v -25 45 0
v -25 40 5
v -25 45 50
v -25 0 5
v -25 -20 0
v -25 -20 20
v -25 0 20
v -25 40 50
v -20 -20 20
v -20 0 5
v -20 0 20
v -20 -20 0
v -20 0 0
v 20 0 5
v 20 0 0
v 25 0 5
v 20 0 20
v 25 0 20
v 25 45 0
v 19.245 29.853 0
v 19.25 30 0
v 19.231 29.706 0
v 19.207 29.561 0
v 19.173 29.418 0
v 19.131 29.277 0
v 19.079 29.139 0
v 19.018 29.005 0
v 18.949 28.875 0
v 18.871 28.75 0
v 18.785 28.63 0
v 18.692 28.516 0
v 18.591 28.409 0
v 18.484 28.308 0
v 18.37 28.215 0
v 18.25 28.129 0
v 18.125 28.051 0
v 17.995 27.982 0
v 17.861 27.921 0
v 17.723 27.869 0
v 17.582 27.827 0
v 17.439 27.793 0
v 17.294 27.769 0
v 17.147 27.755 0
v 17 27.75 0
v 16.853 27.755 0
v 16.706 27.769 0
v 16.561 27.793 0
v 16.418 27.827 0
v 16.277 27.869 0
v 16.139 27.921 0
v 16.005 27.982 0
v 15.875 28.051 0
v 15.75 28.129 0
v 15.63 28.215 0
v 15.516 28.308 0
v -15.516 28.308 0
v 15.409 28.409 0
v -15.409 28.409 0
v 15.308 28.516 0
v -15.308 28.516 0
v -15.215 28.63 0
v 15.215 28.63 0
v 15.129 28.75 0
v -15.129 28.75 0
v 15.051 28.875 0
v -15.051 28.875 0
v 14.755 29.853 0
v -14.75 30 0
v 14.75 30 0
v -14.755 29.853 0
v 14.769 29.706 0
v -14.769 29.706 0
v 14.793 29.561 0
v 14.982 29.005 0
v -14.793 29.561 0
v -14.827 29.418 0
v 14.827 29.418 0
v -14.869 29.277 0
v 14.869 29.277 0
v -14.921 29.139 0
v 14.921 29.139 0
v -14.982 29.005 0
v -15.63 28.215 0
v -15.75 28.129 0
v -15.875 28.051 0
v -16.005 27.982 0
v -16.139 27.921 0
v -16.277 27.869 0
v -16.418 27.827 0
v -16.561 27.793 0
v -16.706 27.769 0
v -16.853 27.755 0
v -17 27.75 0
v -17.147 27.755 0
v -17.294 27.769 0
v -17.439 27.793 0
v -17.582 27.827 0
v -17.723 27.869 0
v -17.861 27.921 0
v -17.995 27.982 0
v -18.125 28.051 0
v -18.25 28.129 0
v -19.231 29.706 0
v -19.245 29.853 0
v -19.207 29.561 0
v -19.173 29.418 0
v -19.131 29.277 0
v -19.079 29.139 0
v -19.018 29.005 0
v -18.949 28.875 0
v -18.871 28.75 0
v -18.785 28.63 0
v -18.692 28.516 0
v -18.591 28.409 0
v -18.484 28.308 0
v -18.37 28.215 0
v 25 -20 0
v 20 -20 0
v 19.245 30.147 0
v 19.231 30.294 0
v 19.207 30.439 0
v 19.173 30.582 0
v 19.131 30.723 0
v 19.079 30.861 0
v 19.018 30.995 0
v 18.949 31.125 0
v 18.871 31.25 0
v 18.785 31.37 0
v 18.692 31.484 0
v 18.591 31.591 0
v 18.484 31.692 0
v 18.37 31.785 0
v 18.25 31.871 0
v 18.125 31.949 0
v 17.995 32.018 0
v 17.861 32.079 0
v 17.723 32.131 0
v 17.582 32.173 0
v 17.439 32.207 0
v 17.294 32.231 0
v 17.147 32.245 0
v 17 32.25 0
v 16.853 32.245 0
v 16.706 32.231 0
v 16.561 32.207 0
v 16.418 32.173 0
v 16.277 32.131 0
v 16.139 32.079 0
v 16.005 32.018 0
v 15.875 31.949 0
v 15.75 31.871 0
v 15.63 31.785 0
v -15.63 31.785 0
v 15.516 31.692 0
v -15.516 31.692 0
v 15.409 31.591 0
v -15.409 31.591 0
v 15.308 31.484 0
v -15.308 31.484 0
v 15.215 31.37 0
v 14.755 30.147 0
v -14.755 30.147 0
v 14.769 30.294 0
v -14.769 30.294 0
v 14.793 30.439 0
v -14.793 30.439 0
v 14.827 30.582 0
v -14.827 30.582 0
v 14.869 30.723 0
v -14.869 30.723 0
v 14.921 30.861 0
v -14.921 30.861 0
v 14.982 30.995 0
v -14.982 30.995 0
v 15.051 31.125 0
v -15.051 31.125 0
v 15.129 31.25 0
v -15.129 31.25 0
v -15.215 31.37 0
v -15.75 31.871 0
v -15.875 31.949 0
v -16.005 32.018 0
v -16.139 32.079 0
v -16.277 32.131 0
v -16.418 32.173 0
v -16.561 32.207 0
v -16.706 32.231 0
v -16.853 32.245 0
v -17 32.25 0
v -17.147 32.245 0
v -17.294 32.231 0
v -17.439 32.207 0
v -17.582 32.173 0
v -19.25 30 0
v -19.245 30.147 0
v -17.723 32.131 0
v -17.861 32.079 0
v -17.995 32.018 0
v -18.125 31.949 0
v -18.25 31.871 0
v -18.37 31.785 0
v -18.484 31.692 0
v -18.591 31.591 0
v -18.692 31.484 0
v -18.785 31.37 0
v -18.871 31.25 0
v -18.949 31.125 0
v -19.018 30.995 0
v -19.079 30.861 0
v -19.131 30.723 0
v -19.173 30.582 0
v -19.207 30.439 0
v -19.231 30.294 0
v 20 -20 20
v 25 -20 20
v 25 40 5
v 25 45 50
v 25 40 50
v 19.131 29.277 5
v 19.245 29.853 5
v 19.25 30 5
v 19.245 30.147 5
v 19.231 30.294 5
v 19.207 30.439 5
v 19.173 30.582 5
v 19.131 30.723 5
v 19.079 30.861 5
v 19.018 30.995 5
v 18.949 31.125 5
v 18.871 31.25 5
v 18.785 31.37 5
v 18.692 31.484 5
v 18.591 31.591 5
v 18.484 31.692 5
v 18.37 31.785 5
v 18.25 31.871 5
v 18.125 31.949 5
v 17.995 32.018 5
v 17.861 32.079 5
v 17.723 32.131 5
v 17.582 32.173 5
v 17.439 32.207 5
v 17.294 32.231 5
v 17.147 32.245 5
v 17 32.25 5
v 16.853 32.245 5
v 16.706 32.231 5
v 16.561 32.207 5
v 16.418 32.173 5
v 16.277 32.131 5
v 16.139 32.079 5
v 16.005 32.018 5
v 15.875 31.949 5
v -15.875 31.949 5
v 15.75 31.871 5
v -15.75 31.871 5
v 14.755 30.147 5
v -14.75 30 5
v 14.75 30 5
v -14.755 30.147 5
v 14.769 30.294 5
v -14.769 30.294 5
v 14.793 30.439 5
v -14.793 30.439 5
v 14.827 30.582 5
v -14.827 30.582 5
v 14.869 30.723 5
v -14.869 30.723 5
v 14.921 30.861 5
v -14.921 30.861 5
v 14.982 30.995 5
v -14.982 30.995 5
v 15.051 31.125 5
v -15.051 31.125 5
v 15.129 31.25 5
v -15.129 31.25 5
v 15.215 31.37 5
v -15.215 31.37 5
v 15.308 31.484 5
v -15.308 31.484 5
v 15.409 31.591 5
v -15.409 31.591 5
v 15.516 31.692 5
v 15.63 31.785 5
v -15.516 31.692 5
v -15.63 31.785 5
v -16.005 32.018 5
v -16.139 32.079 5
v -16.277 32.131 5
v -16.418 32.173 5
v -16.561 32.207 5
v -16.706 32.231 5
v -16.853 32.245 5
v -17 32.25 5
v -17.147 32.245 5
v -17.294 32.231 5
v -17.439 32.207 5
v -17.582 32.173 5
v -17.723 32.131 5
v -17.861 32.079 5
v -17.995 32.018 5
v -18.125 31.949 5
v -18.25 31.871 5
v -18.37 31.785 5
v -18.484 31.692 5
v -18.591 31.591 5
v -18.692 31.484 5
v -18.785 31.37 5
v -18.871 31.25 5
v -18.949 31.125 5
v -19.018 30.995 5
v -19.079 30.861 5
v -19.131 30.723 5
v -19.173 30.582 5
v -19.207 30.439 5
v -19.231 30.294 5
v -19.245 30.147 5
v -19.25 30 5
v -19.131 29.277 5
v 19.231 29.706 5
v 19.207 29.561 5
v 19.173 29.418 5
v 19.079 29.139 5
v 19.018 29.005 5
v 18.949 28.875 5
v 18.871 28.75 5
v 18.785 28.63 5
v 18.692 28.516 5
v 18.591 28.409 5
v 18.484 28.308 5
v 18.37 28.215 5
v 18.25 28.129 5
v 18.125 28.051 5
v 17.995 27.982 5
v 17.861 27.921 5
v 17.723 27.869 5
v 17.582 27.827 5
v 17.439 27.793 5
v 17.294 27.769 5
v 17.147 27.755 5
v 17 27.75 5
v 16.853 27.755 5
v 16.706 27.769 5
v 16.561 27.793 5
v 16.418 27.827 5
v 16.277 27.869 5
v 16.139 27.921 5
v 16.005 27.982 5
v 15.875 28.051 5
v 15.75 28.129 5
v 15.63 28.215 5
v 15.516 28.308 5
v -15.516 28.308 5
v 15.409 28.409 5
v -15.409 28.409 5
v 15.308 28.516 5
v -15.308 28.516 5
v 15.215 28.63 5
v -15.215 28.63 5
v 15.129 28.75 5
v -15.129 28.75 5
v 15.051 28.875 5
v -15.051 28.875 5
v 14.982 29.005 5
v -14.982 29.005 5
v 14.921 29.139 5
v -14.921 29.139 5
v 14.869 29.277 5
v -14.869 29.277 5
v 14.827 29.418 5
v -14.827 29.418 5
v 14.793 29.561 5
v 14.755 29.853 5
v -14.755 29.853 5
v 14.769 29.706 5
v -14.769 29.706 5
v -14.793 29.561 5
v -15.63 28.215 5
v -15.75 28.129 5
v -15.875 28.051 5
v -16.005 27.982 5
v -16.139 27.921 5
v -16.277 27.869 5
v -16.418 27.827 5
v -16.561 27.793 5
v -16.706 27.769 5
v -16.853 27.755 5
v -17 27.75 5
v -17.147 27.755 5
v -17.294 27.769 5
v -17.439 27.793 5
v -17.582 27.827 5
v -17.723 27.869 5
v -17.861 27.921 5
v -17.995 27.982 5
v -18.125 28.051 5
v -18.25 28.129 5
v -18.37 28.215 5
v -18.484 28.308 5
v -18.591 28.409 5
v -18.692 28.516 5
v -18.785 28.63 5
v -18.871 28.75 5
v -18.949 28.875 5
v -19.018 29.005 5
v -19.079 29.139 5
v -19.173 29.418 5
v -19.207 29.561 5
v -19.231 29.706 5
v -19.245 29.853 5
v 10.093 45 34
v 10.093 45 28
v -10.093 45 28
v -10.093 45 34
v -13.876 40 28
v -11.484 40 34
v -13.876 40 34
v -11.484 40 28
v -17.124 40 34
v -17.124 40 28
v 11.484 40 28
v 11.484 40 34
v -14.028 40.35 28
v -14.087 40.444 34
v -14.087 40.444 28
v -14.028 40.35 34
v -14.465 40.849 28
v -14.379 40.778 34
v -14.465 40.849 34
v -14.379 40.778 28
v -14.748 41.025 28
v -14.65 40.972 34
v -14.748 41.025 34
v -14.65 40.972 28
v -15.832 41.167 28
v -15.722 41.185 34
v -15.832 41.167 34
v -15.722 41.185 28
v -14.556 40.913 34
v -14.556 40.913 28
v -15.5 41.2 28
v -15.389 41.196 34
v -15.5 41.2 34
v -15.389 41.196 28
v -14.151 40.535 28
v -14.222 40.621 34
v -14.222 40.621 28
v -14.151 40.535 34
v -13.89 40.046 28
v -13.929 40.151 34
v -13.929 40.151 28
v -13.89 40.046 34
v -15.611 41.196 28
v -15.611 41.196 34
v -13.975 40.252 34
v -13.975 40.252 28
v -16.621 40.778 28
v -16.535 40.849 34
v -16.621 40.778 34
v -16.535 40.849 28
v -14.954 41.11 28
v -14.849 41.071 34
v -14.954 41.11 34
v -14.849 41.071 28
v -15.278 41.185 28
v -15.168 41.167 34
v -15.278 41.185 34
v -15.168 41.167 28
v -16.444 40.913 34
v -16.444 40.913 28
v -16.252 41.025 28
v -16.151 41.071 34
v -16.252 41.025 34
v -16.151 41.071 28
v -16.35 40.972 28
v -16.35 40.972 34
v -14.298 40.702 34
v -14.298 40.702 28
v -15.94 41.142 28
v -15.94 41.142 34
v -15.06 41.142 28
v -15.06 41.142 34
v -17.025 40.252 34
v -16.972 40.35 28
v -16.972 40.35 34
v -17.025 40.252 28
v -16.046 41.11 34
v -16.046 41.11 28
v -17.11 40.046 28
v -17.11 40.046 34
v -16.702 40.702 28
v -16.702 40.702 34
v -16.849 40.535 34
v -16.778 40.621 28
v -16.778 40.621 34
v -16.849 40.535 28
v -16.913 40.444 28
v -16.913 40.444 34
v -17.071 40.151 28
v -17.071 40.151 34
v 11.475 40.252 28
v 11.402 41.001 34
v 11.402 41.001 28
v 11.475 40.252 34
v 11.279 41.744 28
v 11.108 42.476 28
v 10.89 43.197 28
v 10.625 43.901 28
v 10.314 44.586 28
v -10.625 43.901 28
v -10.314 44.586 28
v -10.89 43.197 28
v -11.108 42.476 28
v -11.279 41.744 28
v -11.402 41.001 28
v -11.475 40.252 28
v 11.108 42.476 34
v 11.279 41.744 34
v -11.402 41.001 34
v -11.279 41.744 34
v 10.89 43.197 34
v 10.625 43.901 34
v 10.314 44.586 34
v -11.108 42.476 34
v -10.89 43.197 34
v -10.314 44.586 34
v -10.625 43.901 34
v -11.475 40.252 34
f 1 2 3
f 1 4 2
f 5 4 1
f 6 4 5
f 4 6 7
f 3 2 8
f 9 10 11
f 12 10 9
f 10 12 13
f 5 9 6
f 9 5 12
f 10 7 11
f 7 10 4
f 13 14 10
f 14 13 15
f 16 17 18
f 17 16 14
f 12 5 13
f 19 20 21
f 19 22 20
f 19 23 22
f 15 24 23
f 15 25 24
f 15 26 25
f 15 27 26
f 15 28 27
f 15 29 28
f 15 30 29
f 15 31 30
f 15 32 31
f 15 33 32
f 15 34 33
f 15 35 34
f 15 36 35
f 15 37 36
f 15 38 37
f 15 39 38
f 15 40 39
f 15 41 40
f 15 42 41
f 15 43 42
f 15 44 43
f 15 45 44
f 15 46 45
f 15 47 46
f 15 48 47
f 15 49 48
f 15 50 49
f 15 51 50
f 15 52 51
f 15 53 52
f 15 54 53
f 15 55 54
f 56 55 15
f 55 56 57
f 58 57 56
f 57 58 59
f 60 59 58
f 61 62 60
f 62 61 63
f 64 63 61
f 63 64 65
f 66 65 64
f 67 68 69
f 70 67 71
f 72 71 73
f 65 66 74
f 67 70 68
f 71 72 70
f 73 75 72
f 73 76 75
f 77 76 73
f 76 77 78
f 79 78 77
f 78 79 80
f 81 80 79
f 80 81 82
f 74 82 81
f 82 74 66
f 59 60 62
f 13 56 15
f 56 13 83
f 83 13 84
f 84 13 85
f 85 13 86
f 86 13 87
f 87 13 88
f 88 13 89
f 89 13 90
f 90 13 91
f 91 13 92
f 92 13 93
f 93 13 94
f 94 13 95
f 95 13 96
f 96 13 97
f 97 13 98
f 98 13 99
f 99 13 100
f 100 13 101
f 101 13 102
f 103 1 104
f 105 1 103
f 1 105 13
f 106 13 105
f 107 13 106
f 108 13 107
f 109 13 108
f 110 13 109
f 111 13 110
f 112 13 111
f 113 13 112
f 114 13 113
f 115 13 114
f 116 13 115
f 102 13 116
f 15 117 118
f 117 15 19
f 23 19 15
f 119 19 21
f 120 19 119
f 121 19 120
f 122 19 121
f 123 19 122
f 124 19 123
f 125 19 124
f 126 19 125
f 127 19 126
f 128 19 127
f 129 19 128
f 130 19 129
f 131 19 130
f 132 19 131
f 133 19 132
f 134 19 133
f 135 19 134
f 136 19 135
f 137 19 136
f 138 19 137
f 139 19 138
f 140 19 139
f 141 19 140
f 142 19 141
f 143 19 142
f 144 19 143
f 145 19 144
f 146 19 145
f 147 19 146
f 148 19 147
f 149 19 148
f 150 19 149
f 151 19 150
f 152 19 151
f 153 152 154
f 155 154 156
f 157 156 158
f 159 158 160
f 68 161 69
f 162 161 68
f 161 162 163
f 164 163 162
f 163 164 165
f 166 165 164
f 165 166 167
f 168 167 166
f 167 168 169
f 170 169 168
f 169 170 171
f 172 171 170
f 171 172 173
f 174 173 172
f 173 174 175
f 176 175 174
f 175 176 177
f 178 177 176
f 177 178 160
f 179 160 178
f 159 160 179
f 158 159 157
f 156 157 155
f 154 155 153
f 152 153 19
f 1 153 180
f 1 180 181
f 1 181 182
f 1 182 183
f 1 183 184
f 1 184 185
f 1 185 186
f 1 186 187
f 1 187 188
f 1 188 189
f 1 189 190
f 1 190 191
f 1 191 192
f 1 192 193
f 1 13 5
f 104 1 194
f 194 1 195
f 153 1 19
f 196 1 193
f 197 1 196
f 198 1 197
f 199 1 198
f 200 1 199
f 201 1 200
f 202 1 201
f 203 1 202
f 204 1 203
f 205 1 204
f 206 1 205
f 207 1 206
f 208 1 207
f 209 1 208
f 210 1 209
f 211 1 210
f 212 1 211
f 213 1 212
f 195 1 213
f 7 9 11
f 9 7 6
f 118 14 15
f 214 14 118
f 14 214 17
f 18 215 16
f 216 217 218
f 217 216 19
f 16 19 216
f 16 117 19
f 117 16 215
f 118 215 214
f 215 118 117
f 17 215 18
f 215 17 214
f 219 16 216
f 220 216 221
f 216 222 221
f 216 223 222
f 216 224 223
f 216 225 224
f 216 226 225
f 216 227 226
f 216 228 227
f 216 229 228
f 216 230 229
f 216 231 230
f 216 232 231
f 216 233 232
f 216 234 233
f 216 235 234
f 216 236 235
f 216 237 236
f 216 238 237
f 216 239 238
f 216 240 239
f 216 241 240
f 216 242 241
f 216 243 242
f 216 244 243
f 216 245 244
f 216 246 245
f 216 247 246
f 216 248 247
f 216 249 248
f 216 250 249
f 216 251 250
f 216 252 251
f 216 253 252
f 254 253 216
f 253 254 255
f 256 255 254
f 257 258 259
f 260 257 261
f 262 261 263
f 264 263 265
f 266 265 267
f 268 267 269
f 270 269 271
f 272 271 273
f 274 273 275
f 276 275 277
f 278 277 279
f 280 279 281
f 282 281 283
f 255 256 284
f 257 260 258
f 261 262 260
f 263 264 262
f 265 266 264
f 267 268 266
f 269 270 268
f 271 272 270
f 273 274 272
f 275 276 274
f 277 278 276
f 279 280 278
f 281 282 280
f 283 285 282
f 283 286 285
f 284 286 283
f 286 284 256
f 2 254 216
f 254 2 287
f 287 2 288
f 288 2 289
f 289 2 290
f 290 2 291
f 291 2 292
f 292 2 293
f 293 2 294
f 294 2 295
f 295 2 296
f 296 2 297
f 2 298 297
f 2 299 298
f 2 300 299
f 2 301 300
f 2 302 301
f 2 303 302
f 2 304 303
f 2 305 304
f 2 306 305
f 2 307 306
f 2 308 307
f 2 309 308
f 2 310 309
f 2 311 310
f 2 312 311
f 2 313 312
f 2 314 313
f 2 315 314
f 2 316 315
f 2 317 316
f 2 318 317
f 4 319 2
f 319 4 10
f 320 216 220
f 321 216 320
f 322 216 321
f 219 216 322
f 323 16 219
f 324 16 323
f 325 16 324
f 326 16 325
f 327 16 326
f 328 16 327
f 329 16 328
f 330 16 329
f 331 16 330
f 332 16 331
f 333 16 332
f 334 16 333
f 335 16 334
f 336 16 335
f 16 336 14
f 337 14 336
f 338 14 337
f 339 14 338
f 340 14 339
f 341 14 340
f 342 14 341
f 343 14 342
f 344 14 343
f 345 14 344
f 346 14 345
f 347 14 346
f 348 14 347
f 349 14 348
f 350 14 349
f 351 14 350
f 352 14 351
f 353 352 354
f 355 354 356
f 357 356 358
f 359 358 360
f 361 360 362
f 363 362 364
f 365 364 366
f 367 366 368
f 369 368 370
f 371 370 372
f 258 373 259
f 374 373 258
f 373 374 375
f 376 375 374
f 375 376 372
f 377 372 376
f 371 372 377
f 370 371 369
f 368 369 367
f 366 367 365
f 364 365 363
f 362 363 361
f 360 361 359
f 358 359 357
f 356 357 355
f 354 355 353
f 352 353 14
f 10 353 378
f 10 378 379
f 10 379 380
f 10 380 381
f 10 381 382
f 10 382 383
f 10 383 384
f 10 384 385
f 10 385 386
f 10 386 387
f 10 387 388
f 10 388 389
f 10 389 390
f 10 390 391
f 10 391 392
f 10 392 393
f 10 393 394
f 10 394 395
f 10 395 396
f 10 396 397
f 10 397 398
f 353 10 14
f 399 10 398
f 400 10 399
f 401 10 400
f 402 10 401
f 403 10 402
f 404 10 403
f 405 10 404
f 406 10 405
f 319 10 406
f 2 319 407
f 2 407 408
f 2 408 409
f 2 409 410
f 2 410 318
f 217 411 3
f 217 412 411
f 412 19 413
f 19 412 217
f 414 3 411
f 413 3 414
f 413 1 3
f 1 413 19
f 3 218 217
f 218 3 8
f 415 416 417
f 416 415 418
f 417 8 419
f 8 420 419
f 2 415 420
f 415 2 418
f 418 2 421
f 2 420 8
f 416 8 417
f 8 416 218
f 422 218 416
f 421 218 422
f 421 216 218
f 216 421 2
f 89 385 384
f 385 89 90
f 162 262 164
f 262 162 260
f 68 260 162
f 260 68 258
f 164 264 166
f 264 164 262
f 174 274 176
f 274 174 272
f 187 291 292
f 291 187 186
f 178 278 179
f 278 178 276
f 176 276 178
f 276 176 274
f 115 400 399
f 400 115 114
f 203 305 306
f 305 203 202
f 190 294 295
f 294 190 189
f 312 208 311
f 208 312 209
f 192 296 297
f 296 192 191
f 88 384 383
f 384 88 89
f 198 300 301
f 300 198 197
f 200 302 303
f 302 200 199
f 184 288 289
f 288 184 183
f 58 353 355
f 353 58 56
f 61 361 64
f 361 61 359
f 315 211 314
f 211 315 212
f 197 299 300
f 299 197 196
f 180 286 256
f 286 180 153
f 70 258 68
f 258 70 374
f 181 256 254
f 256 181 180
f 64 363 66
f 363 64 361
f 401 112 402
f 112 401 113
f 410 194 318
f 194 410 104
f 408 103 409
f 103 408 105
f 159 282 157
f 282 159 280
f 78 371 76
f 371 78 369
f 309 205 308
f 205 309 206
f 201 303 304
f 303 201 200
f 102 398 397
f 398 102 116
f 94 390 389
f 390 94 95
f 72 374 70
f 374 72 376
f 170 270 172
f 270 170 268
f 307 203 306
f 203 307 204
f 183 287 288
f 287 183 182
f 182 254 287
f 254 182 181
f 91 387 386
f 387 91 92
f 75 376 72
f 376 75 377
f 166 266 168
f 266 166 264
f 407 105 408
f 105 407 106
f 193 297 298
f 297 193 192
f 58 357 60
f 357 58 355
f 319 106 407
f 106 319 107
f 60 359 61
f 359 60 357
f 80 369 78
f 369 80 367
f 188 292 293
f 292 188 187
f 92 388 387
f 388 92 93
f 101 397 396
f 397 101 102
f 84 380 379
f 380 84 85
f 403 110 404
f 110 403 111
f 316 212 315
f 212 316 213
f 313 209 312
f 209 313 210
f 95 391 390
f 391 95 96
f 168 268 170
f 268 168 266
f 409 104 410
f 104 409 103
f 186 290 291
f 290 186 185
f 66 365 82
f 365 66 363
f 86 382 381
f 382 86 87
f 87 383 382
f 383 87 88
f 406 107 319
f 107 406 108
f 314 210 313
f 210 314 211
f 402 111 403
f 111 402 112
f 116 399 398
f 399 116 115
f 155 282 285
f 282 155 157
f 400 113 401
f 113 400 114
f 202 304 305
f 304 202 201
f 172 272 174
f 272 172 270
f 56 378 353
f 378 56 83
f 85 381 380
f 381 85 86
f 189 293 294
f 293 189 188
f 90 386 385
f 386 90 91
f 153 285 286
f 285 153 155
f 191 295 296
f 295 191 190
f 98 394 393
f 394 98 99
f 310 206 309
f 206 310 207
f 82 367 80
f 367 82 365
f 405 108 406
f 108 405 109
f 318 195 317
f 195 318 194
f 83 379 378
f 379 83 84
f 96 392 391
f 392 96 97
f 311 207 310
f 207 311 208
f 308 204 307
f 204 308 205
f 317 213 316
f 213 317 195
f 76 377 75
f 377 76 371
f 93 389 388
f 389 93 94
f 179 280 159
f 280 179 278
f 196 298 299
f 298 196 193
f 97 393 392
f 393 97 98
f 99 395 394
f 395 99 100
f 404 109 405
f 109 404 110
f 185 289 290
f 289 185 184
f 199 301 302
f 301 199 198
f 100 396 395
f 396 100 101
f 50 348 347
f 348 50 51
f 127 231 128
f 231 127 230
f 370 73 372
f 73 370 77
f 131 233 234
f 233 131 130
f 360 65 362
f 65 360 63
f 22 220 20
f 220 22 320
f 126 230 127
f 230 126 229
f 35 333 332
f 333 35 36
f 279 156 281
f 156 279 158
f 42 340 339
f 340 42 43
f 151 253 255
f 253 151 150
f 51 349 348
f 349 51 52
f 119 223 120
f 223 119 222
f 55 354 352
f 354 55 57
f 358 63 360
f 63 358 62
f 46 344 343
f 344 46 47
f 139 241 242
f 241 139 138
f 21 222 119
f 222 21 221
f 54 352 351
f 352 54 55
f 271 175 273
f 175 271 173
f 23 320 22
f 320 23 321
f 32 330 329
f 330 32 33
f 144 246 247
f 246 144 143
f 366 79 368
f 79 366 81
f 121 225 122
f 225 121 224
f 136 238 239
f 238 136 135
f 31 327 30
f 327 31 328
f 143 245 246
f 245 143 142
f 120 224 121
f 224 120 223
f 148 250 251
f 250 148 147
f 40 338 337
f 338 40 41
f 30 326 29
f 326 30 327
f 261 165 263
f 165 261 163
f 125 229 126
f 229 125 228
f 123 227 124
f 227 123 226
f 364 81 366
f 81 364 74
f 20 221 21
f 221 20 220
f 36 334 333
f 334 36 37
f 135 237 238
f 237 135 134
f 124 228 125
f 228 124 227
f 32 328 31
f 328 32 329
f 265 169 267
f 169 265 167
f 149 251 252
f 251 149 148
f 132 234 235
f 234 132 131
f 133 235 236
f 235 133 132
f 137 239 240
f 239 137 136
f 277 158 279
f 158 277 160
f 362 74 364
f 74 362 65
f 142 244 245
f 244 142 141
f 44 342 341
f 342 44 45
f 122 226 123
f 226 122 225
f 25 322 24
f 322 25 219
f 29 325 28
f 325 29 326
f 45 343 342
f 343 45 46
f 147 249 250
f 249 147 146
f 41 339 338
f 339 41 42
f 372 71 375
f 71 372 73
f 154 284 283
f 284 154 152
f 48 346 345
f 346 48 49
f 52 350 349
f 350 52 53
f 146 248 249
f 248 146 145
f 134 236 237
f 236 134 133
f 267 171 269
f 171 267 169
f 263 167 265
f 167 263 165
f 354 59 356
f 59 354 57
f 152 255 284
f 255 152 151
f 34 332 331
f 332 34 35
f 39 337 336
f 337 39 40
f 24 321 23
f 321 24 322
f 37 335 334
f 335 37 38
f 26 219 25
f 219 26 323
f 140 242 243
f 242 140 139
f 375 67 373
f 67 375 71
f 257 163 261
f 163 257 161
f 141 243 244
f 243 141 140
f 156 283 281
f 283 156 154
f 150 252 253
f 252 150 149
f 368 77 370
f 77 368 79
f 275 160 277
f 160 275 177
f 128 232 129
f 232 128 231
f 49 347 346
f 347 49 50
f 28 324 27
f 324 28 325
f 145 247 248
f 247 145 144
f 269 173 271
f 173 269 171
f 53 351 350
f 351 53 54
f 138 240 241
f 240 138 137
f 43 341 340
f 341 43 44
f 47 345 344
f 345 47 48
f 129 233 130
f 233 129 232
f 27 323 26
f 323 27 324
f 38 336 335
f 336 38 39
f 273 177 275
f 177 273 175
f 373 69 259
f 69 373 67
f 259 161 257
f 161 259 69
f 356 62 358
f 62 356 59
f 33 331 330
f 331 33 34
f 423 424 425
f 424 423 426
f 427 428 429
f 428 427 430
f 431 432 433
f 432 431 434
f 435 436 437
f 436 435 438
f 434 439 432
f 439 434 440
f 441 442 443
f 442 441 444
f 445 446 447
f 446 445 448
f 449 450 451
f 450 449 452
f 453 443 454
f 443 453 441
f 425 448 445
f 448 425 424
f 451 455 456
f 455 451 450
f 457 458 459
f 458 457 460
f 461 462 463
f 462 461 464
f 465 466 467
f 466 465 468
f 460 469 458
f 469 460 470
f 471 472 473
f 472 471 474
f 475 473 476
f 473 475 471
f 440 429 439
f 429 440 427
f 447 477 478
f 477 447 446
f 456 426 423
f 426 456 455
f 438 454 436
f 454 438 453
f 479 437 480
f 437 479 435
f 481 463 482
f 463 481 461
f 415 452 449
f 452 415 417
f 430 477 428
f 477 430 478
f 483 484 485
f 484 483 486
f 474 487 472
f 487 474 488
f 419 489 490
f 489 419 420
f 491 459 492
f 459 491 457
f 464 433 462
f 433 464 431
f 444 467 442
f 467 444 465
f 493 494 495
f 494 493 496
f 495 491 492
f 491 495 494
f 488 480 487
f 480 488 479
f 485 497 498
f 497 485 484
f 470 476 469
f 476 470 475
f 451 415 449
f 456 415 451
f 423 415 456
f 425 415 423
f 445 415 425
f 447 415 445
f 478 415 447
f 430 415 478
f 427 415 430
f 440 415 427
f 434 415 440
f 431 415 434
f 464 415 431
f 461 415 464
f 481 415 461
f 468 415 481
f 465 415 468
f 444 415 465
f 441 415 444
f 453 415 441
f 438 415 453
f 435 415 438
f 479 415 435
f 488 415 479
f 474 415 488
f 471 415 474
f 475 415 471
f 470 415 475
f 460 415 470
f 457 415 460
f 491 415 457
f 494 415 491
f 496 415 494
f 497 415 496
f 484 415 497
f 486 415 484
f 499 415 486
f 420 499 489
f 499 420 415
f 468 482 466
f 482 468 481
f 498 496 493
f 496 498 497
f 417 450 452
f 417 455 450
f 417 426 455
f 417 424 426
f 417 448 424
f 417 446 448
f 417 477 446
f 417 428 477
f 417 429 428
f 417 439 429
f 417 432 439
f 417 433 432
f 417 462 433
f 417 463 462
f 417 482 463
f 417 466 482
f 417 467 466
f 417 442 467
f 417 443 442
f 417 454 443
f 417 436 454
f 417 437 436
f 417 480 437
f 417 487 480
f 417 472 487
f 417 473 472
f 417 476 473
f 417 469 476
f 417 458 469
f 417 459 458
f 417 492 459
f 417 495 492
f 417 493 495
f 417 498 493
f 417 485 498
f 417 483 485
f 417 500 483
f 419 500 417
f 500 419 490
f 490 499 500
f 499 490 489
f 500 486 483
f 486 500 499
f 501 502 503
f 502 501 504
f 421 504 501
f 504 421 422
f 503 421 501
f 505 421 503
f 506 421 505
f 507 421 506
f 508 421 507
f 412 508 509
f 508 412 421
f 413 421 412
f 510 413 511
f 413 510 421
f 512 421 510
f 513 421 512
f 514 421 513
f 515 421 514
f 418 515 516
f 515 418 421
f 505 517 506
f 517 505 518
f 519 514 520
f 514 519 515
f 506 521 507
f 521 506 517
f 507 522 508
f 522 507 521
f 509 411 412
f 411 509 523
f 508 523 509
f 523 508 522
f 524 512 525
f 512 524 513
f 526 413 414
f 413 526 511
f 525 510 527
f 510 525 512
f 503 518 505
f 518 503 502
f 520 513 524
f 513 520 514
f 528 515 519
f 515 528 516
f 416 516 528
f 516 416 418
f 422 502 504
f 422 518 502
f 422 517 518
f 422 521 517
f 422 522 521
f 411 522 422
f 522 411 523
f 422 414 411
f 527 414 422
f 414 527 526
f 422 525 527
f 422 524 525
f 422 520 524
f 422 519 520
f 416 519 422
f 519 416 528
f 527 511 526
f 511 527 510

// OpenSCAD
// L-shaped mounting bracket for NEMA 17 stepper motor (e.g. syringe pump)
// Print orientation: base plate on bed, vertical motor plate builds upward

// ---------- Parameters ----------
base_x1      = -25;   // base plate left edge
base_x2      = 25;    // base plate right edge
base_y1      = 0;     // base plate front edge
base_y2      = 45;    // base plate back edge
base_z       = 5;     // base plate thickness

motor_h      = 50;    // motor plate height (z)
motor_y      = 5;     // motor plate thickness (y)

boss_d       = 23;    // motor centring boss hole diameter
boss_x       = 0;     // boss hole centre x
boss_z       = 28;    // boss hole centre z

screw_d      = 3.4;   // M3 screw hole diameter
screw_pitch  = 31;    // square pattern side length

gusset_t     = 5;     // gusset thickness (x)
gusset_leg   = 20;    // right triangle leg length (Y and Z)
gusset_x1    = -25;   // left gusset start x
gusset_x2    = -20;   // left gusset end x
gusset_x3    = 20;    // right gusset start x
gusset_x4    = 25;    // right gusset end x

eps          = 0.5;   // cutter overshoot past faces

$fn = 96;

// ---------- Model ----------
difference() {
    union() {
        // Base plate
        translate([base_x1, base_y1, 0])
            cube([base_x2 - base_x1, base_y2 - base_y1, base_z]);

        // Vertical motor plate
        translate([base_x1, base_y2 - motor_y, 0])
            cube([base_x2 - base_x1, motor_y, motor_h]);

        // Gussets: right triangle in YZ, legs along +Y and +Z, right angle at (y=5, z=5)
        for (sx = [gusset_x1, gusset_x3])
            translate([sx, 0, 0])
                rotate([90, 0, 0])
                    cube([gusset_t, gusset_leg, gusset_leg]);
    }

    // Base plate through-holes (M4)
    for (x = [-17, 17], y = 30)
        translate([x, y, -eps])
            cylinder(d = 4.5, h = base_z + 2 * eps);

    // Motor plate boss hole (along Y)
    translate([boss_x, base_y2 - motor_y - eps, boss_z])
        cylinder(d = boss_d, h = motor_y + 2 * eps);

    // Motor plate screw holes (M3, square pattern centred on boss)
    for (a = [0, 90, 180, 270])
        rotate([0, 0, a])
            translate([boss_x - screw_pitch / 2, base_y2 - motor_y - eps, boss_z])
                cylinder(d = screw_d, h = motor_y + 2 * eps);
}
